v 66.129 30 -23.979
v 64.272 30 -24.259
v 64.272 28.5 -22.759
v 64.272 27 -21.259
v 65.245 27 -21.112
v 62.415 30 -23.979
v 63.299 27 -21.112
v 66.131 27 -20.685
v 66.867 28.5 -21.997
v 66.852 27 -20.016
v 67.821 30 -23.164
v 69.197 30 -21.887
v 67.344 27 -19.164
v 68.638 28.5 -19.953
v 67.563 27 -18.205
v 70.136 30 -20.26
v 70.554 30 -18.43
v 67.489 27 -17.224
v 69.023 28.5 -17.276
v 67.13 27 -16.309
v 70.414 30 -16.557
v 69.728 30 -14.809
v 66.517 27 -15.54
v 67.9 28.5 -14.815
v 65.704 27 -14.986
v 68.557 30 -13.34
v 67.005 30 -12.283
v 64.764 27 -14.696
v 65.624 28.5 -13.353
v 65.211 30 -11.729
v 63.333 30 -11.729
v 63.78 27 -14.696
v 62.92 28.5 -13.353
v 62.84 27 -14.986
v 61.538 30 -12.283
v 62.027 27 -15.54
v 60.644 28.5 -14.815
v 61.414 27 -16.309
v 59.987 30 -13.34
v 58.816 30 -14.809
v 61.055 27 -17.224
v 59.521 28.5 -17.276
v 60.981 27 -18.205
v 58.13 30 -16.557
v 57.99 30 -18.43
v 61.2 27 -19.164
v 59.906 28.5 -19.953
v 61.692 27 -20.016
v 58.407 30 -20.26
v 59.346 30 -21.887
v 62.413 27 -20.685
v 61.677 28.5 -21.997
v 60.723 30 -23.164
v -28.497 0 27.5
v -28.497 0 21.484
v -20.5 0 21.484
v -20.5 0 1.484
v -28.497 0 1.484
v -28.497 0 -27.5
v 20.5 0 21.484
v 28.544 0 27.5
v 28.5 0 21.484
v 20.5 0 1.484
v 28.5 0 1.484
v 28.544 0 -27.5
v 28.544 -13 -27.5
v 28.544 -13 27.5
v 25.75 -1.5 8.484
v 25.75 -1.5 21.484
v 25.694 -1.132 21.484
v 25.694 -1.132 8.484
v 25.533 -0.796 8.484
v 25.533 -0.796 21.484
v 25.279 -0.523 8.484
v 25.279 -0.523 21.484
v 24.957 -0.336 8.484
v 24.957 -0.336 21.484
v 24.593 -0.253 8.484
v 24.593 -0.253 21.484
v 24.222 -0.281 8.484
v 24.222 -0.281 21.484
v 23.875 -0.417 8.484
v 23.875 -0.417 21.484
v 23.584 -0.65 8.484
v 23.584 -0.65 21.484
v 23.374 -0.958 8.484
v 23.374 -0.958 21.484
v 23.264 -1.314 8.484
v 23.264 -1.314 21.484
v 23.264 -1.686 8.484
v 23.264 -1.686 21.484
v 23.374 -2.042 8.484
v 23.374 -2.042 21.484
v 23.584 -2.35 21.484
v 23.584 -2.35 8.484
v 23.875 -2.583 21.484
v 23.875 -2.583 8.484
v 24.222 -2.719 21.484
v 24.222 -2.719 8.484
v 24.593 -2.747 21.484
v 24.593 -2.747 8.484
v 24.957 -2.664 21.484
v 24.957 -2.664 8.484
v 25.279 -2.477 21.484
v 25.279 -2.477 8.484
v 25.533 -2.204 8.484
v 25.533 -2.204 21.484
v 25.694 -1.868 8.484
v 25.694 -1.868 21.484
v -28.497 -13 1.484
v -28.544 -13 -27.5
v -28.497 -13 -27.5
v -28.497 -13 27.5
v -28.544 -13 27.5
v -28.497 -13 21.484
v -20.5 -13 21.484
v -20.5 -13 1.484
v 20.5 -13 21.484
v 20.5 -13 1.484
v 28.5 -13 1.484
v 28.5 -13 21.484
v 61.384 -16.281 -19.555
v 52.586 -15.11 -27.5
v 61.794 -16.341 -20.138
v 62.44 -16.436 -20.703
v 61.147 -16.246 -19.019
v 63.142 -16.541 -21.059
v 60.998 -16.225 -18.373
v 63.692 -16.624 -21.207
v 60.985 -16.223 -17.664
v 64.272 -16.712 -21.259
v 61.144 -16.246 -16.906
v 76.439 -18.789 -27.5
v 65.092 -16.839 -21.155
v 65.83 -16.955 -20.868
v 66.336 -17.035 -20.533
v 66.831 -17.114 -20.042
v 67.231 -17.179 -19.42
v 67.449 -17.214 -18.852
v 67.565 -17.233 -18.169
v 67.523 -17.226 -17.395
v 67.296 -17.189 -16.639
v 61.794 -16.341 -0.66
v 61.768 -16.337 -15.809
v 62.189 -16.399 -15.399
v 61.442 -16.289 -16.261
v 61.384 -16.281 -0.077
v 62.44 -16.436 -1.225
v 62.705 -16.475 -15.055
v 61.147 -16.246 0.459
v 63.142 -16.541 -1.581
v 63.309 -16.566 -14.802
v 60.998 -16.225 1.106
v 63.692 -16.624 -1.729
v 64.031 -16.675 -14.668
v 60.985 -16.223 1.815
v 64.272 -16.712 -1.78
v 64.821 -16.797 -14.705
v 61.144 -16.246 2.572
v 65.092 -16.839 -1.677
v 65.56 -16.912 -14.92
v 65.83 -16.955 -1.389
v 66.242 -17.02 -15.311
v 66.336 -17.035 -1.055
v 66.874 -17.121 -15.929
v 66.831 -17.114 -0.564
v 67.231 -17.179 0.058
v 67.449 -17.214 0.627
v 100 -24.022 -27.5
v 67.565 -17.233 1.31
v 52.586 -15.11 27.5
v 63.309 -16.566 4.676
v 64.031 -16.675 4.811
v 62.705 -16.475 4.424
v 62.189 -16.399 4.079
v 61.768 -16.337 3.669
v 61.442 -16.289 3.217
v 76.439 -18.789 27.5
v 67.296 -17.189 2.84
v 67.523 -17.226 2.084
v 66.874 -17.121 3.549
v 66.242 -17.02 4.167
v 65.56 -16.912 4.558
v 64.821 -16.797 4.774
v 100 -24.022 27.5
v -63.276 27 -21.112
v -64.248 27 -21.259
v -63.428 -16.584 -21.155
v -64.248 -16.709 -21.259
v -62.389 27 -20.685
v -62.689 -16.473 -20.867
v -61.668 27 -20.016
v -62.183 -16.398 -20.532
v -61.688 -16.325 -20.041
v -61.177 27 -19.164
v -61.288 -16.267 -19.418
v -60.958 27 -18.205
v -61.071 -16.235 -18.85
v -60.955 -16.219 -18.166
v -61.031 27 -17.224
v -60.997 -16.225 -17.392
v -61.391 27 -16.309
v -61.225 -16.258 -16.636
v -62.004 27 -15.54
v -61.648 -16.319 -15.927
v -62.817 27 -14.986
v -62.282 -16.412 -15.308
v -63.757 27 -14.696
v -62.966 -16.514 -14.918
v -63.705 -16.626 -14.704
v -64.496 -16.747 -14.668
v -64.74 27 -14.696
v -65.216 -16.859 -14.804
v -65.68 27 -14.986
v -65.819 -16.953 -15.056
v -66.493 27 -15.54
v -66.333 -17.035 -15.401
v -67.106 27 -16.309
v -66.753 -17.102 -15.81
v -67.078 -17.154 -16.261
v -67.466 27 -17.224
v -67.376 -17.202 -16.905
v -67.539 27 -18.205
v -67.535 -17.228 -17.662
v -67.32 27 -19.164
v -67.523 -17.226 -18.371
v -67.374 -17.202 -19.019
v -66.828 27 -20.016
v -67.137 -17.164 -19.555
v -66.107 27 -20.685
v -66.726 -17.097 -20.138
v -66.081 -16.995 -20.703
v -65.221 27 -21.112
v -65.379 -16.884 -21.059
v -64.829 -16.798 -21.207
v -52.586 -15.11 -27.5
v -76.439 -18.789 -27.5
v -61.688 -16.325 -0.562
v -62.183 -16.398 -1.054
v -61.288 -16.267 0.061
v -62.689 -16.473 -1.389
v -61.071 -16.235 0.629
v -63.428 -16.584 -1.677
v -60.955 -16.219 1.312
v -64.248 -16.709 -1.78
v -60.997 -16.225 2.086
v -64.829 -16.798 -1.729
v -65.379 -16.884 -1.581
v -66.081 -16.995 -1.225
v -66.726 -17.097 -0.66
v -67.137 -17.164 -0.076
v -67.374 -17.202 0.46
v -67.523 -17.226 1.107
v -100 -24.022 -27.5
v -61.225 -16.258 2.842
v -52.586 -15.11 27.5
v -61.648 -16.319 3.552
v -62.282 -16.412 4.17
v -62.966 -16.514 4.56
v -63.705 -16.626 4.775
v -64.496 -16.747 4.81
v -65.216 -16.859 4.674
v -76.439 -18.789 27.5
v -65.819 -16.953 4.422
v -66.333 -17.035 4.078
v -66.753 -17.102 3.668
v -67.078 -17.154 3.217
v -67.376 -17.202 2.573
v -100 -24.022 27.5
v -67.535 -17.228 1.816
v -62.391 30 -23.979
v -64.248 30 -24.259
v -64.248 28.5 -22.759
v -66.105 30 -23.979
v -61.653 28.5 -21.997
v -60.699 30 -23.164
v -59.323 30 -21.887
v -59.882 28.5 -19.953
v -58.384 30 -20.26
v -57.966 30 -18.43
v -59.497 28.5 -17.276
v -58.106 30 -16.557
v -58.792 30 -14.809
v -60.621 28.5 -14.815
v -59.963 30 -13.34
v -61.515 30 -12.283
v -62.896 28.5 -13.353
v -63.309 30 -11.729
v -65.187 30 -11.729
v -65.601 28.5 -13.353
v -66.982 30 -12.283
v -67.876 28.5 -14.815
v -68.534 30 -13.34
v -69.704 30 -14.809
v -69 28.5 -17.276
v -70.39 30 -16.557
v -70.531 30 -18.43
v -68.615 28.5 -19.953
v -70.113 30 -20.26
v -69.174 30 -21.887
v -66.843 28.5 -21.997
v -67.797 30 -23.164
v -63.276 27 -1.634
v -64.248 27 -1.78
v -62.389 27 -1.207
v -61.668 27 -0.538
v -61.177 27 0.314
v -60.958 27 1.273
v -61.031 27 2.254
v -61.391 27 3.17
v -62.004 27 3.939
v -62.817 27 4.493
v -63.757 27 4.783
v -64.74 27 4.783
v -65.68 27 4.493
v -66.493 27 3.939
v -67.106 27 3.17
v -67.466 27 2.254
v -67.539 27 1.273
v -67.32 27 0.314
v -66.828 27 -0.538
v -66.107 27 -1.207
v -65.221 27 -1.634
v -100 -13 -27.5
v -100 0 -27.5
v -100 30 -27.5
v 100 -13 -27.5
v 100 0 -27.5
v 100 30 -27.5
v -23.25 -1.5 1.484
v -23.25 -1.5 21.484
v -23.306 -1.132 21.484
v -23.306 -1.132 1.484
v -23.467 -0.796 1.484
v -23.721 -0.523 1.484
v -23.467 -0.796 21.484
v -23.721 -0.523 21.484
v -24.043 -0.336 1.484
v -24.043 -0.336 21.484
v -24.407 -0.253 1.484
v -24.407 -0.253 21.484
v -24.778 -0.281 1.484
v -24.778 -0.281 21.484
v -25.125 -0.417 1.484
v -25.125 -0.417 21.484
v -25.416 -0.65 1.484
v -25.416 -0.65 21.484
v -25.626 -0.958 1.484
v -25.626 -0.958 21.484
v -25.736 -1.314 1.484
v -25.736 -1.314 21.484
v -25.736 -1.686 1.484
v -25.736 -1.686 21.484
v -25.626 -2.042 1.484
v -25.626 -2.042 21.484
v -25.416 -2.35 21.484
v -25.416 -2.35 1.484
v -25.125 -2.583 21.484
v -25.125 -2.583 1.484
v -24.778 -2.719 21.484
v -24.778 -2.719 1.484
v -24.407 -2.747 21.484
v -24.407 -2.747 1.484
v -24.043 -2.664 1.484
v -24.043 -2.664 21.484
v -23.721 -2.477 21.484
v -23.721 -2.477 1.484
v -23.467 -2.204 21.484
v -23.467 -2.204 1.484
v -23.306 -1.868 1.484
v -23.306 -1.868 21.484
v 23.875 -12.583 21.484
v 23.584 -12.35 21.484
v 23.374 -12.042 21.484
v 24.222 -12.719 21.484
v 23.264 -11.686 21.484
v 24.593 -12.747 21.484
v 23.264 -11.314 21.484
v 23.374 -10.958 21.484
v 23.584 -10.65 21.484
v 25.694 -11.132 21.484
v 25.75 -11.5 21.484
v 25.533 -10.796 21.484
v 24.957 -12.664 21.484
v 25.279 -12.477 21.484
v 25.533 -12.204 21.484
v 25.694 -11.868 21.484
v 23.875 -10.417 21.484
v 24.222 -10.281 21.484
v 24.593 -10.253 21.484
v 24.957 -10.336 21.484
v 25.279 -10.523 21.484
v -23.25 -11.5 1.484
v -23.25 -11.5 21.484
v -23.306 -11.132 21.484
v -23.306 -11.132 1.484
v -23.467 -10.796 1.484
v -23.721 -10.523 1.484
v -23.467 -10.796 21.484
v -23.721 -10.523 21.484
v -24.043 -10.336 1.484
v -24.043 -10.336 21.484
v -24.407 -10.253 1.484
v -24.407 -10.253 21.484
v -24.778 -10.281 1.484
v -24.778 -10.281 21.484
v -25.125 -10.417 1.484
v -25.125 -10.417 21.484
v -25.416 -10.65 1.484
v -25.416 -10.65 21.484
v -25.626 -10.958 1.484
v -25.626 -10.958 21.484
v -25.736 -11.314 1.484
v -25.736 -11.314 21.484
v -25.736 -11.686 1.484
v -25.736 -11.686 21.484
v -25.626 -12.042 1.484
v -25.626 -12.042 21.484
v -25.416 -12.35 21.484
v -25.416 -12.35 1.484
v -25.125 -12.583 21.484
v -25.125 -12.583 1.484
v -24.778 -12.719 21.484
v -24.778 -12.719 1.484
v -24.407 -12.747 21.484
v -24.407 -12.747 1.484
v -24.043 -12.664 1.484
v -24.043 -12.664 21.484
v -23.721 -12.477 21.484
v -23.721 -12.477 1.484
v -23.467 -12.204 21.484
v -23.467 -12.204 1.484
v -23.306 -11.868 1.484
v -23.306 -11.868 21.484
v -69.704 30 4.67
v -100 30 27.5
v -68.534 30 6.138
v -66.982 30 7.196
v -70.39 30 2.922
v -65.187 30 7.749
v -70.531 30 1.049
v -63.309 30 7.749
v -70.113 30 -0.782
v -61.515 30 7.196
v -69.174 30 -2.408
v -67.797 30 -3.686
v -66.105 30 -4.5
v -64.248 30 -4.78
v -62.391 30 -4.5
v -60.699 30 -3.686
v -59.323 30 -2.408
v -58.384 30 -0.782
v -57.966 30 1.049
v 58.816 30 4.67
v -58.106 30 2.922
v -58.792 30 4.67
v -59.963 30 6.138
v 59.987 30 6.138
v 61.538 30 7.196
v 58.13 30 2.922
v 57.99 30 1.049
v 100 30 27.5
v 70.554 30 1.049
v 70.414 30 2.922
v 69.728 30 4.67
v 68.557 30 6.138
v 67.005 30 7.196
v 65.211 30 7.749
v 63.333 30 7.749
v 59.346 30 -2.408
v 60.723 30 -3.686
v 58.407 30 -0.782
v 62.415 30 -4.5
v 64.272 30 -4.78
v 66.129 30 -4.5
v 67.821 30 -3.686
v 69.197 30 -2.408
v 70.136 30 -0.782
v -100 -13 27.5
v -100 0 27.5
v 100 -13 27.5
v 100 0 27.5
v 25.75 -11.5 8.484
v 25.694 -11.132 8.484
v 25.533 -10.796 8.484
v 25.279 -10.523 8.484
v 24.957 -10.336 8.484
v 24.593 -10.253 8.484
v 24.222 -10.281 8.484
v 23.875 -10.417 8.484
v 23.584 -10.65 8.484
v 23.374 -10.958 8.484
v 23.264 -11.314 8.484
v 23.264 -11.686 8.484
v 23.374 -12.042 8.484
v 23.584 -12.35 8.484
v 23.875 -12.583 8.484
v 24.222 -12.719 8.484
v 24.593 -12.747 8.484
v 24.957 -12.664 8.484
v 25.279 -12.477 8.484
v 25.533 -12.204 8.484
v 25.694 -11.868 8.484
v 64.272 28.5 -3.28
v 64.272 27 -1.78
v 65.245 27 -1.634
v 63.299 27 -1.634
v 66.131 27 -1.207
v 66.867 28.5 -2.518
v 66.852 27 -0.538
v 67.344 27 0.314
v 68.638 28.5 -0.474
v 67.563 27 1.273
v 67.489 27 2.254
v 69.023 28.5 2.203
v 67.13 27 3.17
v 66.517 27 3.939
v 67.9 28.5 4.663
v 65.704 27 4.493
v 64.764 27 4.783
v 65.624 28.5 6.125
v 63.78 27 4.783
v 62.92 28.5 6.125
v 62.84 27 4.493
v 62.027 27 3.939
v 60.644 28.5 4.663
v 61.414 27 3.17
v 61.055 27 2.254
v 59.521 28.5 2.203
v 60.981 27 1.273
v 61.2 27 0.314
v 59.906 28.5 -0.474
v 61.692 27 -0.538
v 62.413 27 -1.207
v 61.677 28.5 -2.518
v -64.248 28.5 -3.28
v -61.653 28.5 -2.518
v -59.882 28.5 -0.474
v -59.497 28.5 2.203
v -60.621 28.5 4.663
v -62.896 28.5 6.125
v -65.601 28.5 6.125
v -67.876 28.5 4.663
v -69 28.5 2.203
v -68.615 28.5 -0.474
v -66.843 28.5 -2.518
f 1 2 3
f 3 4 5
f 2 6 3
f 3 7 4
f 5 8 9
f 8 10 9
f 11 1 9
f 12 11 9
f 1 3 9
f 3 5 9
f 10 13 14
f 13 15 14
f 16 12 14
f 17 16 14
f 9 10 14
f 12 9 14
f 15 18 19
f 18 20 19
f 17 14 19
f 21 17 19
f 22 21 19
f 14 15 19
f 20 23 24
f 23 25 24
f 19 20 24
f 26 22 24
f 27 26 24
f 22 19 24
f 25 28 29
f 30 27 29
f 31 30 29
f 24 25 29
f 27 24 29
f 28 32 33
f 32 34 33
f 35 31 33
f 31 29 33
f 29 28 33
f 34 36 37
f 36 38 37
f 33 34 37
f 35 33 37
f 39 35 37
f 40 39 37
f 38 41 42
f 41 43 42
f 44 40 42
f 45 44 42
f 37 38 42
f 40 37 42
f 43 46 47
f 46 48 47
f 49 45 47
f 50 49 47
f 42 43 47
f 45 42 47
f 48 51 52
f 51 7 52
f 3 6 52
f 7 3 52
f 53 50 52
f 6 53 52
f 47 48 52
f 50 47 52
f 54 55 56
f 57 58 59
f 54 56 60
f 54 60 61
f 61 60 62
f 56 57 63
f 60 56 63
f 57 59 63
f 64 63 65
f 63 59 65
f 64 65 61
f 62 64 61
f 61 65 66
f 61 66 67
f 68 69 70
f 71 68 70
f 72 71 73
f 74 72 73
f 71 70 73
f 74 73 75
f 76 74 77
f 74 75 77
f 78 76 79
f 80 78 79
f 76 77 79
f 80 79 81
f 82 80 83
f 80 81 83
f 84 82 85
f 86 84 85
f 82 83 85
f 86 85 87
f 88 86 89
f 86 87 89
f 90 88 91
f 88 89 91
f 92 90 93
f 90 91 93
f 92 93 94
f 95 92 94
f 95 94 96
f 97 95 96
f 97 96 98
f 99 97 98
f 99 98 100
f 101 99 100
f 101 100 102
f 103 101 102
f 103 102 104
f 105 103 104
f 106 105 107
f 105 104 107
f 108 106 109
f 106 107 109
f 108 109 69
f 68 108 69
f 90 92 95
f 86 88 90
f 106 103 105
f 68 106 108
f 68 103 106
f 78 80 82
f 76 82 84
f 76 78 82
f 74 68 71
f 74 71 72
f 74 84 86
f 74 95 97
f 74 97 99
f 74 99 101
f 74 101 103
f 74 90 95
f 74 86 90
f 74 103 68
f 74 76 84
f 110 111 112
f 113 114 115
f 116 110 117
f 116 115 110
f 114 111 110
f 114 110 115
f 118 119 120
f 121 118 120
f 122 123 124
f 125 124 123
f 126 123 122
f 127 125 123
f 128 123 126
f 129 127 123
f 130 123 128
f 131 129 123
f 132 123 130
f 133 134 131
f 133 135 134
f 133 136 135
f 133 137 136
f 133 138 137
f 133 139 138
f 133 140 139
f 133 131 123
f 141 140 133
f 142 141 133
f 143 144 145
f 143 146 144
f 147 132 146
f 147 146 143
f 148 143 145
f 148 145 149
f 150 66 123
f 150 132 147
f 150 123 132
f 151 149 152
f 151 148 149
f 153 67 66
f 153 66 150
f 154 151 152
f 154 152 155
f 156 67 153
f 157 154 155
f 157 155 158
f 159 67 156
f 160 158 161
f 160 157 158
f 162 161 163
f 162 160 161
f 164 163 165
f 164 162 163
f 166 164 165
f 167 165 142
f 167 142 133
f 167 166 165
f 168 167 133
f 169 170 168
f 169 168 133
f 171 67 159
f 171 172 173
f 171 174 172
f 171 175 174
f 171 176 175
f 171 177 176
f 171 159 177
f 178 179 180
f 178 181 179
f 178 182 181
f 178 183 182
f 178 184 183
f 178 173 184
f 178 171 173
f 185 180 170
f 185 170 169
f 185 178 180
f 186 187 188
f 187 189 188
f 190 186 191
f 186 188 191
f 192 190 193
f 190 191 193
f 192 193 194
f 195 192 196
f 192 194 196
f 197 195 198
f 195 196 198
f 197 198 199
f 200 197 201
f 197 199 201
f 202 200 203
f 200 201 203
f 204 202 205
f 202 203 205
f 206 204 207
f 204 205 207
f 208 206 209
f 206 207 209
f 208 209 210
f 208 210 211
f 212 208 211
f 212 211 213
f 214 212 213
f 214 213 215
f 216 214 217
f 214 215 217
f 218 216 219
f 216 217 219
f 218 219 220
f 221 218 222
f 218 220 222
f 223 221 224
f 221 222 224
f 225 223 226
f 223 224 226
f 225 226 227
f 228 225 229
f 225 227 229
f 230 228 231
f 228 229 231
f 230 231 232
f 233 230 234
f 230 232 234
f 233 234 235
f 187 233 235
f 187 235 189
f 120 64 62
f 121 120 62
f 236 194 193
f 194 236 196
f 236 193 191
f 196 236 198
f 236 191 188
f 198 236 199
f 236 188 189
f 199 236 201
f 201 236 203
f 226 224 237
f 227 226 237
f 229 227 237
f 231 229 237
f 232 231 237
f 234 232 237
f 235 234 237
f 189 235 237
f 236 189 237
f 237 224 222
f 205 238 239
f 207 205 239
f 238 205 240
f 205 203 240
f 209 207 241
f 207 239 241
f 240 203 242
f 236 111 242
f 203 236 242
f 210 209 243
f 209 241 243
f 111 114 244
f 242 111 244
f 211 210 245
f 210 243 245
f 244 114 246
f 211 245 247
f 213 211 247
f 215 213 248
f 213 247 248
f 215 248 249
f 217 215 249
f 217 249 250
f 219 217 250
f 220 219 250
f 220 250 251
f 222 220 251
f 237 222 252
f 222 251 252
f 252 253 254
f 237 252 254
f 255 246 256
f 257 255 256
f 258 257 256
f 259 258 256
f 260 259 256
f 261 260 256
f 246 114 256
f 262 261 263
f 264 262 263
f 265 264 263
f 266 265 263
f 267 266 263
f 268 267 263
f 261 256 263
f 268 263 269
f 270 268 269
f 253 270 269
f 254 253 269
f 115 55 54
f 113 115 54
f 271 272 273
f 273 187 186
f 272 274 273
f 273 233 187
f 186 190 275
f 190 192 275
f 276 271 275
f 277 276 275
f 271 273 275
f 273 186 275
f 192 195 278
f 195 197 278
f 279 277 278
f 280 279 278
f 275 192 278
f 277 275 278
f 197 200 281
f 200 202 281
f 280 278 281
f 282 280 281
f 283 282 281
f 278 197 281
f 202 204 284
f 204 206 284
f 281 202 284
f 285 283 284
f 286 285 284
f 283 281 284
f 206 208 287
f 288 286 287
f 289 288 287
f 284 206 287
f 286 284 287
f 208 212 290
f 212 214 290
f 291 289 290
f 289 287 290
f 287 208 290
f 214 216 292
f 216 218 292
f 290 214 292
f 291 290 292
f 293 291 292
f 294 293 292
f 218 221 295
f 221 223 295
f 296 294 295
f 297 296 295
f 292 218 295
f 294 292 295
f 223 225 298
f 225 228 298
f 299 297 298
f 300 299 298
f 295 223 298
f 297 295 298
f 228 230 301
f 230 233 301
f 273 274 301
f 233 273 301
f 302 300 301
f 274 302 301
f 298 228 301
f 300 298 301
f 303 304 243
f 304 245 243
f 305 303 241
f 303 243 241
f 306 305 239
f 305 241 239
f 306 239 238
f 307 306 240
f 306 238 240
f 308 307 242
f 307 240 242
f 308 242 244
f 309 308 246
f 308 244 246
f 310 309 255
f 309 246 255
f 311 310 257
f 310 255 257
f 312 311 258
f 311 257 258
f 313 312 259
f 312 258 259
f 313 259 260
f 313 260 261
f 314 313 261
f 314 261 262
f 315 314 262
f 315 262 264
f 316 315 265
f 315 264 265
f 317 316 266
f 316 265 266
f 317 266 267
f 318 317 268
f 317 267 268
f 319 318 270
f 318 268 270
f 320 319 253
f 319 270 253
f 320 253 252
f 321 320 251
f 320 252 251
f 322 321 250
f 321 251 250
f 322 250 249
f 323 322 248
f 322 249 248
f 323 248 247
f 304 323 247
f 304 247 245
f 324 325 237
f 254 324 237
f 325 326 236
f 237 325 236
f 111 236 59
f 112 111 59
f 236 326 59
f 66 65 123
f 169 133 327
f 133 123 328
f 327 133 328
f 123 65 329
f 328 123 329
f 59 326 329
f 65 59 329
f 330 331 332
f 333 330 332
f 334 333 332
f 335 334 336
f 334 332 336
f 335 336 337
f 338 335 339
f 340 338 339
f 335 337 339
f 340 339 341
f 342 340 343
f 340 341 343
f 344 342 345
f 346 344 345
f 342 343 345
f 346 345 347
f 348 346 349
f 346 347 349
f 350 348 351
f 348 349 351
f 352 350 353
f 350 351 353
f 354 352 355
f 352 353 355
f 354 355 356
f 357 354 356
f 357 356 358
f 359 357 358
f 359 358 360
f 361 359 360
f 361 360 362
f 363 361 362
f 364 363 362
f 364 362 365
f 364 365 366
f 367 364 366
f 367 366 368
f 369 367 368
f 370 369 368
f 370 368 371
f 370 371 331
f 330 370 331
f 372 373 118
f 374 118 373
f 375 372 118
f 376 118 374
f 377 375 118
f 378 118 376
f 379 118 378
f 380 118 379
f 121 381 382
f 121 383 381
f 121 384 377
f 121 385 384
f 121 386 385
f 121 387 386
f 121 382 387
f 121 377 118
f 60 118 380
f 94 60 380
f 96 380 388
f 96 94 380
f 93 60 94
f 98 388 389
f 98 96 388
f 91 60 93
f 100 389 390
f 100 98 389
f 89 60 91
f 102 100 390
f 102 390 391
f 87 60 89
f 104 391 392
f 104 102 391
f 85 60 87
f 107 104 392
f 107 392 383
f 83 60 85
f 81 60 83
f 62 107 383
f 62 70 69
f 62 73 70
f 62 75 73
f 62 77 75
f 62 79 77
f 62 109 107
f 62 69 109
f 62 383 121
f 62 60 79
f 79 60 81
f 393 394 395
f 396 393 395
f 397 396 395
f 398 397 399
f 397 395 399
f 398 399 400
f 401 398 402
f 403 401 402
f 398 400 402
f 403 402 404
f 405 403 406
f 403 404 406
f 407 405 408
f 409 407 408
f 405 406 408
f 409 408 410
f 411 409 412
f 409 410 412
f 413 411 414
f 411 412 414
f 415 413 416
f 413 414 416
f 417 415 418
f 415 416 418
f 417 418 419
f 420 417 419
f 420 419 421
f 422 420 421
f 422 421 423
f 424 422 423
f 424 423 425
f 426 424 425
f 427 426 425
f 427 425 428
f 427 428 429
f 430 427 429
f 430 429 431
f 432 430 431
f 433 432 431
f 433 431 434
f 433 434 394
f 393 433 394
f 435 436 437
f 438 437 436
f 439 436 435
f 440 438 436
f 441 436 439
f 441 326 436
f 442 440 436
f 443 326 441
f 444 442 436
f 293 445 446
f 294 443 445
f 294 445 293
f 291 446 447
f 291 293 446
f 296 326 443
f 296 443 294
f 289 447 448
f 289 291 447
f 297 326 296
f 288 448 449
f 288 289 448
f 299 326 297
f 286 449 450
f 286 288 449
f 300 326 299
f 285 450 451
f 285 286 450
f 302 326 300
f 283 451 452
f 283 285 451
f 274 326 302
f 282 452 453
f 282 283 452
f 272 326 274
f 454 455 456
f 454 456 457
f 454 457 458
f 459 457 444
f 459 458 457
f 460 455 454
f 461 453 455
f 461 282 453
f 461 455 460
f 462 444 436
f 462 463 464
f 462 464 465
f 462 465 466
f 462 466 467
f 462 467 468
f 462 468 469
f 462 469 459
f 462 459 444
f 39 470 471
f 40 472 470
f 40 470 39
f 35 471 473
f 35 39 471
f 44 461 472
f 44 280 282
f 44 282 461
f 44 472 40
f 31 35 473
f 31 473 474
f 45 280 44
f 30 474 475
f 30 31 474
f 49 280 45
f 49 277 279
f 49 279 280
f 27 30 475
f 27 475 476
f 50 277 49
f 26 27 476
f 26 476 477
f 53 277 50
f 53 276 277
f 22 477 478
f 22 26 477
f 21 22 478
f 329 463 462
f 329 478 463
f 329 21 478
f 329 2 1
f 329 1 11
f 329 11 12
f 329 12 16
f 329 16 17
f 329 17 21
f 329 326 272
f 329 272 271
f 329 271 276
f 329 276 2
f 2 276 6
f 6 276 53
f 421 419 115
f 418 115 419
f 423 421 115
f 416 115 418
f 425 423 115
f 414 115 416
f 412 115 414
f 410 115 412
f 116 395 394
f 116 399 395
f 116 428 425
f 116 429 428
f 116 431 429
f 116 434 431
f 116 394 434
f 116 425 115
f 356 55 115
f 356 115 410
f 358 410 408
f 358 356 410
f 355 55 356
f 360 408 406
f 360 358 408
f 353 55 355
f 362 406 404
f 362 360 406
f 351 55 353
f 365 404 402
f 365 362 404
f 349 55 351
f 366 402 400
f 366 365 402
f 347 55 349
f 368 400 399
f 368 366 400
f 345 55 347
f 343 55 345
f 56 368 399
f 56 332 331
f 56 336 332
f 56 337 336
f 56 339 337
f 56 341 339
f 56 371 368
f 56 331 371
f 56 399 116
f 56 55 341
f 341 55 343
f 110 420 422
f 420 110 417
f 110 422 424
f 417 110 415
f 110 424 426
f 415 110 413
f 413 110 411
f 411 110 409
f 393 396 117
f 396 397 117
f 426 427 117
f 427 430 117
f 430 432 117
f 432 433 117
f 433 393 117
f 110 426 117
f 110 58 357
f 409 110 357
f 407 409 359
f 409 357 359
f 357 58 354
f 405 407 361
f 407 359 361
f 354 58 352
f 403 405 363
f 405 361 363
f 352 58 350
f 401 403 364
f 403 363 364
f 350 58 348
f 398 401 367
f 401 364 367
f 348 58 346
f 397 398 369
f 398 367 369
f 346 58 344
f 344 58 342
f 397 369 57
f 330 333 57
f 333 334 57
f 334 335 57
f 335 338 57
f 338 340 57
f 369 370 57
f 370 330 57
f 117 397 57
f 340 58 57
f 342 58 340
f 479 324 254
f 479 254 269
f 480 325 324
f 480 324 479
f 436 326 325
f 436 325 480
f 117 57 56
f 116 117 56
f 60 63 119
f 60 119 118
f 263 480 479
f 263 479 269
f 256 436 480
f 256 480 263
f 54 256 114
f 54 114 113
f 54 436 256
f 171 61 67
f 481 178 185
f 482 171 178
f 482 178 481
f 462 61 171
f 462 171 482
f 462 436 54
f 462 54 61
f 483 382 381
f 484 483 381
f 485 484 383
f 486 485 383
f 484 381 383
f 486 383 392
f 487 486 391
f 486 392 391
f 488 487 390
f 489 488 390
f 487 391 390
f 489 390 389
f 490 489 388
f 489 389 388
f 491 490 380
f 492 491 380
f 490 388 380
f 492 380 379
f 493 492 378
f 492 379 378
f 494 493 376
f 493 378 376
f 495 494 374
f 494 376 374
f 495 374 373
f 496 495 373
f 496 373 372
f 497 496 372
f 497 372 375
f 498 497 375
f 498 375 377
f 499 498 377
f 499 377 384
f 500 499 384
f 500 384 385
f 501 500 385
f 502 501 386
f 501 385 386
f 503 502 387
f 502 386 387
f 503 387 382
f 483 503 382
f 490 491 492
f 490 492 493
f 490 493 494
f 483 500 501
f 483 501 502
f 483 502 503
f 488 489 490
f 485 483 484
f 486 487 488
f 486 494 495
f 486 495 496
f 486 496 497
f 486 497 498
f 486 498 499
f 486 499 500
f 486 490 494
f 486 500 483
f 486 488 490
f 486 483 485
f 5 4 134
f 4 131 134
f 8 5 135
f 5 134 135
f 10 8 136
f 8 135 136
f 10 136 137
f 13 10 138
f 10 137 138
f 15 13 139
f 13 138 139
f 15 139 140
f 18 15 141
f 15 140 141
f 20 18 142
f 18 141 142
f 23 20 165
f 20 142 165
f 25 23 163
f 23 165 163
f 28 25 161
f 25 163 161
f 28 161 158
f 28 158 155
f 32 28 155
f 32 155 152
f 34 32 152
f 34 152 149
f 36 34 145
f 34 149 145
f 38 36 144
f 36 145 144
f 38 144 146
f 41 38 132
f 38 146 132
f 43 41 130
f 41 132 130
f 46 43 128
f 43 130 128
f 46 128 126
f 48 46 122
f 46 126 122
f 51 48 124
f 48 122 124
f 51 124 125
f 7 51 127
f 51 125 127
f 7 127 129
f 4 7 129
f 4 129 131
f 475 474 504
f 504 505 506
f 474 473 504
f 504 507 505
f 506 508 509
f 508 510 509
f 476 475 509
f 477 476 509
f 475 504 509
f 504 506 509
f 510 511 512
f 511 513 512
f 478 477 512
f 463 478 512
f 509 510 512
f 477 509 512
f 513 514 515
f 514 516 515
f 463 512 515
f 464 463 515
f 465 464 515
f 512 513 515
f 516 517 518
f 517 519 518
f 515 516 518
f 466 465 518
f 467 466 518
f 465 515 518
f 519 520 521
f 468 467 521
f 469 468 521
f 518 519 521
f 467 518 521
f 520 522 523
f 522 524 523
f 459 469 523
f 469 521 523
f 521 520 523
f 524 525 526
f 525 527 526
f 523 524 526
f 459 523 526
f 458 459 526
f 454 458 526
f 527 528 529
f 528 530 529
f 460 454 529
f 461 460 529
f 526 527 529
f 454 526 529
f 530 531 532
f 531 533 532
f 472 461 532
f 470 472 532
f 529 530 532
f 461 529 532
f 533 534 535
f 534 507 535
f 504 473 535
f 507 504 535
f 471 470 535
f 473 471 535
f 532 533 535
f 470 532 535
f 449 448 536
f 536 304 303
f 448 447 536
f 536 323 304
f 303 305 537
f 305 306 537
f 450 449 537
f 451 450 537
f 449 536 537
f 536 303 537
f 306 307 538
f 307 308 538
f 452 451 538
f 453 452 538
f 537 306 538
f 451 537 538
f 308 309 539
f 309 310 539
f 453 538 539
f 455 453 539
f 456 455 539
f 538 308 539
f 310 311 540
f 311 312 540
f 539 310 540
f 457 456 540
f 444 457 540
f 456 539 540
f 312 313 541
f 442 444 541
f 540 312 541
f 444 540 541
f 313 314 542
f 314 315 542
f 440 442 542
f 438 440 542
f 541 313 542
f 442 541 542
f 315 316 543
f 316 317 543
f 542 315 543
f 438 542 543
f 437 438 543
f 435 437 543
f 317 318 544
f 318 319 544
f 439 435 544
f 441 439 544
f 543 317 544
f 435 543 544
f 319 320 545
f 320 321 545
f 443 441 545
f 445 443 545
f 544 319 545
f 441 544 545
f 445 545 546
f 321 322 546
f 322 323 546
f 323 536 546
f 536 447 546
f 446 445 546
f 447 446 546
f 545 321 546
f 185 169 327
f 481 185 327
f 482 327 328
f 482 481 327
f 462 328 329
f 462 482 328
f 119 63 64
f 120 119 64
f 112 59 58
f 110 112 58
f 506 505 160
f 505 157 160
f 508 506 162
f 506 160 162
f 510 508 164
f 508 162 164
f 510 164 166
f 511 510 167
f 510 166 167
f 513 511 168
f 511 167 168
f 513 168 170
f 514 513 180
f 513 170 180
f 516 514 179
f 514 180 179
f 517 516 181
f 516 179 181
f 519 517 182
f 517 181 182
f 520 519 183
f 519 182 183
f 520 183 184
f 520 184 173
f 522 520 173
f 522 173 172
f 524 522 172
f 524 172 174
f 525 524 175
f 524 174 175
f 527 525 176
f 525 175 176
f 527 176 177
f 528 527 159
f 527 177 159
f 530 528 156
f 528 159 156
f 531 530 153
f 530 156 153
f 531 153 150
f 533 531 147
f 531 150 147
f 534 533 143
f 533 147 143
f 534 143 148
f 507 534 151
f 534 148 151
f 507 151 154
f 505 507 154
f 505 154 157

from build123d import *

# Parameters (mm, degrees)
SKETCH1_W                                       = 200
SKETCH1_H                                       = 55
BOSS_EXTRUDE1_DEPTH                             = 30
SKETCH2_W                                       = 8
SKETCH2_H                                       = 20
BOSS_EXTRUDE2_DEPTH                             = 13
SKETCH7_R                                       = 1.25
CUT_EXTRUDE1_DEPTH                              = 49.984212522
SKETCH11_R                                      = 1.25
CUT_EXTRUDE2_DEPTH                              = 13
SKETCH13_W                                      = 71.503175403
SKETCH13_H                                      = 55
SKETCH13_W_2                                    = 71.456081763
BOSS_EXTRUDE3_DEPTH                             = 13
BOSS_EXTRUDE4_DEPTH                             = 55
CSK_FOR_M6_FLAT_HEAD_MACHINE_SCREW2_D           = 6.6
CSK_FOR_M6_FLAT_HEAD_MACHINE_SCREW2_CSINK_D     = 12.6
CSK_FOR_M6_FLAT_HEAD_MACHINE_SCREW2_CSINK_ANGLE = 90


with BuildPart() as part:
    # Sketch1 → Boss-Extrude1 (new body)
    with BuildSketch(Plane(origin=(0, 0, 0), x_dir=(1, 0, 0), z_dir=(0, 1, 0))):
        Rectangle(SKETCH1_W, SKETCH1_H)
    extrude(amount=BOSS_EXTRUDE1_DEPTH)

    # Sketch2 → Boss-Extrude2 (add)
    with BuildSketch(Plane.XZ):
        with Locations((-24.5, 11.484212522)):
            Rectangle(SKETCH2_W, SKETCH2_H)
        with Locations((24.5, 11.484212522)):
            Rectangle(SKETCH2_W, SKETCH2_H)
    extrude(amount=BOSS_EXTRUDE2_DEPTH)

    # Sketch7 → Cut-Extrude1 (cut, through all)
    with BuildSketch(Plane.XY.offset(21.484212522)):
        with Locations((-24.5, -1.5)):
            Circle(SKETCH7_R)
        with Locations((-24.5, -11.5)):
            Circle(SKETCH7_R)
    extrude(amount=-CUT_EXTRUDE1_DEPTH, mode=Mode.SUBTRACT)

    # Sketch11 → Cut-Extrude2 (cut)
    with BuildSketch(Plane.XY.offset(21.484212522)):
        with Locations((24.5, -1.5)):
            Circle(SKETCH11_R)
        with Locations((24.5, -11.5)):
            Circle(SKETCH11_R)
    extrude(amount=-CUT_EXTRUDE2_DEPTH, mode=Mode.SUBTRACT)

    # Sketch13 → Boss-Extrude3 (add)
    with BuildSketch(Plane.XZ):
        with Locations((-64.248412298, 0)):
            Rectangle(SKETCH13_W, SKETCH13_H)
        with Locations((64.271959119, 0)):
            Rectangle(SKETCH13_W_2, SKETCH13_H)
    extrude(amount=BOSS_EXTRUDE3_DEPTH)

    # Sketch26 → Boss-Extrude4 (add, through all)
    with BuildSketch(Plane.XY.offset(27.5)):
        with BuildLine():
            Line((100, -24.02177079), (100, -13))
            Line((100, -13), (28.543918237, -13))
            ThreePointArc((28.543918237, -13), (64.542951108, -16.753996588), (100, -24.02177079))
        make_face()
        with BuildLine():
            Line((-100, -24.02177079), (-100, -13))
            Line((-100, -13), (-28.543918237, -13))
            ThreePointArc((-28.543918237, -13), (-64.542951108, -16.753996588), (-100, -24.02177079))
        make_face()
    extrude(amount=-BOSS_EXTRUDE4_DEPTH)

    # CSK for M6 Flat Head Machine Screw2 (through all)
    with Locations(Plane(origin=(-64.248412299, 30, -17.95872272), x_dir=(0, 0, 1), z_dir=(0, 1, 0))):
        with Locations((0, 0), (0, 128.520371417), (19.47835626, 0), (19.47835626, 128.520371417)):
            CounterSinkHole(CSK_FOR_M6_FLAT_HEAD_MACHINE_SCREW2_D / 2, CSK_FOR_M6_FLAT_HEAD_MACHINE_SCREW2_CSINK_D / 2, counter_sink_angle=CSK_FOR_M6_FLAT_HEAD_MACHINE_SCREW2_CSINK_ANGLE)


solid = part.part
